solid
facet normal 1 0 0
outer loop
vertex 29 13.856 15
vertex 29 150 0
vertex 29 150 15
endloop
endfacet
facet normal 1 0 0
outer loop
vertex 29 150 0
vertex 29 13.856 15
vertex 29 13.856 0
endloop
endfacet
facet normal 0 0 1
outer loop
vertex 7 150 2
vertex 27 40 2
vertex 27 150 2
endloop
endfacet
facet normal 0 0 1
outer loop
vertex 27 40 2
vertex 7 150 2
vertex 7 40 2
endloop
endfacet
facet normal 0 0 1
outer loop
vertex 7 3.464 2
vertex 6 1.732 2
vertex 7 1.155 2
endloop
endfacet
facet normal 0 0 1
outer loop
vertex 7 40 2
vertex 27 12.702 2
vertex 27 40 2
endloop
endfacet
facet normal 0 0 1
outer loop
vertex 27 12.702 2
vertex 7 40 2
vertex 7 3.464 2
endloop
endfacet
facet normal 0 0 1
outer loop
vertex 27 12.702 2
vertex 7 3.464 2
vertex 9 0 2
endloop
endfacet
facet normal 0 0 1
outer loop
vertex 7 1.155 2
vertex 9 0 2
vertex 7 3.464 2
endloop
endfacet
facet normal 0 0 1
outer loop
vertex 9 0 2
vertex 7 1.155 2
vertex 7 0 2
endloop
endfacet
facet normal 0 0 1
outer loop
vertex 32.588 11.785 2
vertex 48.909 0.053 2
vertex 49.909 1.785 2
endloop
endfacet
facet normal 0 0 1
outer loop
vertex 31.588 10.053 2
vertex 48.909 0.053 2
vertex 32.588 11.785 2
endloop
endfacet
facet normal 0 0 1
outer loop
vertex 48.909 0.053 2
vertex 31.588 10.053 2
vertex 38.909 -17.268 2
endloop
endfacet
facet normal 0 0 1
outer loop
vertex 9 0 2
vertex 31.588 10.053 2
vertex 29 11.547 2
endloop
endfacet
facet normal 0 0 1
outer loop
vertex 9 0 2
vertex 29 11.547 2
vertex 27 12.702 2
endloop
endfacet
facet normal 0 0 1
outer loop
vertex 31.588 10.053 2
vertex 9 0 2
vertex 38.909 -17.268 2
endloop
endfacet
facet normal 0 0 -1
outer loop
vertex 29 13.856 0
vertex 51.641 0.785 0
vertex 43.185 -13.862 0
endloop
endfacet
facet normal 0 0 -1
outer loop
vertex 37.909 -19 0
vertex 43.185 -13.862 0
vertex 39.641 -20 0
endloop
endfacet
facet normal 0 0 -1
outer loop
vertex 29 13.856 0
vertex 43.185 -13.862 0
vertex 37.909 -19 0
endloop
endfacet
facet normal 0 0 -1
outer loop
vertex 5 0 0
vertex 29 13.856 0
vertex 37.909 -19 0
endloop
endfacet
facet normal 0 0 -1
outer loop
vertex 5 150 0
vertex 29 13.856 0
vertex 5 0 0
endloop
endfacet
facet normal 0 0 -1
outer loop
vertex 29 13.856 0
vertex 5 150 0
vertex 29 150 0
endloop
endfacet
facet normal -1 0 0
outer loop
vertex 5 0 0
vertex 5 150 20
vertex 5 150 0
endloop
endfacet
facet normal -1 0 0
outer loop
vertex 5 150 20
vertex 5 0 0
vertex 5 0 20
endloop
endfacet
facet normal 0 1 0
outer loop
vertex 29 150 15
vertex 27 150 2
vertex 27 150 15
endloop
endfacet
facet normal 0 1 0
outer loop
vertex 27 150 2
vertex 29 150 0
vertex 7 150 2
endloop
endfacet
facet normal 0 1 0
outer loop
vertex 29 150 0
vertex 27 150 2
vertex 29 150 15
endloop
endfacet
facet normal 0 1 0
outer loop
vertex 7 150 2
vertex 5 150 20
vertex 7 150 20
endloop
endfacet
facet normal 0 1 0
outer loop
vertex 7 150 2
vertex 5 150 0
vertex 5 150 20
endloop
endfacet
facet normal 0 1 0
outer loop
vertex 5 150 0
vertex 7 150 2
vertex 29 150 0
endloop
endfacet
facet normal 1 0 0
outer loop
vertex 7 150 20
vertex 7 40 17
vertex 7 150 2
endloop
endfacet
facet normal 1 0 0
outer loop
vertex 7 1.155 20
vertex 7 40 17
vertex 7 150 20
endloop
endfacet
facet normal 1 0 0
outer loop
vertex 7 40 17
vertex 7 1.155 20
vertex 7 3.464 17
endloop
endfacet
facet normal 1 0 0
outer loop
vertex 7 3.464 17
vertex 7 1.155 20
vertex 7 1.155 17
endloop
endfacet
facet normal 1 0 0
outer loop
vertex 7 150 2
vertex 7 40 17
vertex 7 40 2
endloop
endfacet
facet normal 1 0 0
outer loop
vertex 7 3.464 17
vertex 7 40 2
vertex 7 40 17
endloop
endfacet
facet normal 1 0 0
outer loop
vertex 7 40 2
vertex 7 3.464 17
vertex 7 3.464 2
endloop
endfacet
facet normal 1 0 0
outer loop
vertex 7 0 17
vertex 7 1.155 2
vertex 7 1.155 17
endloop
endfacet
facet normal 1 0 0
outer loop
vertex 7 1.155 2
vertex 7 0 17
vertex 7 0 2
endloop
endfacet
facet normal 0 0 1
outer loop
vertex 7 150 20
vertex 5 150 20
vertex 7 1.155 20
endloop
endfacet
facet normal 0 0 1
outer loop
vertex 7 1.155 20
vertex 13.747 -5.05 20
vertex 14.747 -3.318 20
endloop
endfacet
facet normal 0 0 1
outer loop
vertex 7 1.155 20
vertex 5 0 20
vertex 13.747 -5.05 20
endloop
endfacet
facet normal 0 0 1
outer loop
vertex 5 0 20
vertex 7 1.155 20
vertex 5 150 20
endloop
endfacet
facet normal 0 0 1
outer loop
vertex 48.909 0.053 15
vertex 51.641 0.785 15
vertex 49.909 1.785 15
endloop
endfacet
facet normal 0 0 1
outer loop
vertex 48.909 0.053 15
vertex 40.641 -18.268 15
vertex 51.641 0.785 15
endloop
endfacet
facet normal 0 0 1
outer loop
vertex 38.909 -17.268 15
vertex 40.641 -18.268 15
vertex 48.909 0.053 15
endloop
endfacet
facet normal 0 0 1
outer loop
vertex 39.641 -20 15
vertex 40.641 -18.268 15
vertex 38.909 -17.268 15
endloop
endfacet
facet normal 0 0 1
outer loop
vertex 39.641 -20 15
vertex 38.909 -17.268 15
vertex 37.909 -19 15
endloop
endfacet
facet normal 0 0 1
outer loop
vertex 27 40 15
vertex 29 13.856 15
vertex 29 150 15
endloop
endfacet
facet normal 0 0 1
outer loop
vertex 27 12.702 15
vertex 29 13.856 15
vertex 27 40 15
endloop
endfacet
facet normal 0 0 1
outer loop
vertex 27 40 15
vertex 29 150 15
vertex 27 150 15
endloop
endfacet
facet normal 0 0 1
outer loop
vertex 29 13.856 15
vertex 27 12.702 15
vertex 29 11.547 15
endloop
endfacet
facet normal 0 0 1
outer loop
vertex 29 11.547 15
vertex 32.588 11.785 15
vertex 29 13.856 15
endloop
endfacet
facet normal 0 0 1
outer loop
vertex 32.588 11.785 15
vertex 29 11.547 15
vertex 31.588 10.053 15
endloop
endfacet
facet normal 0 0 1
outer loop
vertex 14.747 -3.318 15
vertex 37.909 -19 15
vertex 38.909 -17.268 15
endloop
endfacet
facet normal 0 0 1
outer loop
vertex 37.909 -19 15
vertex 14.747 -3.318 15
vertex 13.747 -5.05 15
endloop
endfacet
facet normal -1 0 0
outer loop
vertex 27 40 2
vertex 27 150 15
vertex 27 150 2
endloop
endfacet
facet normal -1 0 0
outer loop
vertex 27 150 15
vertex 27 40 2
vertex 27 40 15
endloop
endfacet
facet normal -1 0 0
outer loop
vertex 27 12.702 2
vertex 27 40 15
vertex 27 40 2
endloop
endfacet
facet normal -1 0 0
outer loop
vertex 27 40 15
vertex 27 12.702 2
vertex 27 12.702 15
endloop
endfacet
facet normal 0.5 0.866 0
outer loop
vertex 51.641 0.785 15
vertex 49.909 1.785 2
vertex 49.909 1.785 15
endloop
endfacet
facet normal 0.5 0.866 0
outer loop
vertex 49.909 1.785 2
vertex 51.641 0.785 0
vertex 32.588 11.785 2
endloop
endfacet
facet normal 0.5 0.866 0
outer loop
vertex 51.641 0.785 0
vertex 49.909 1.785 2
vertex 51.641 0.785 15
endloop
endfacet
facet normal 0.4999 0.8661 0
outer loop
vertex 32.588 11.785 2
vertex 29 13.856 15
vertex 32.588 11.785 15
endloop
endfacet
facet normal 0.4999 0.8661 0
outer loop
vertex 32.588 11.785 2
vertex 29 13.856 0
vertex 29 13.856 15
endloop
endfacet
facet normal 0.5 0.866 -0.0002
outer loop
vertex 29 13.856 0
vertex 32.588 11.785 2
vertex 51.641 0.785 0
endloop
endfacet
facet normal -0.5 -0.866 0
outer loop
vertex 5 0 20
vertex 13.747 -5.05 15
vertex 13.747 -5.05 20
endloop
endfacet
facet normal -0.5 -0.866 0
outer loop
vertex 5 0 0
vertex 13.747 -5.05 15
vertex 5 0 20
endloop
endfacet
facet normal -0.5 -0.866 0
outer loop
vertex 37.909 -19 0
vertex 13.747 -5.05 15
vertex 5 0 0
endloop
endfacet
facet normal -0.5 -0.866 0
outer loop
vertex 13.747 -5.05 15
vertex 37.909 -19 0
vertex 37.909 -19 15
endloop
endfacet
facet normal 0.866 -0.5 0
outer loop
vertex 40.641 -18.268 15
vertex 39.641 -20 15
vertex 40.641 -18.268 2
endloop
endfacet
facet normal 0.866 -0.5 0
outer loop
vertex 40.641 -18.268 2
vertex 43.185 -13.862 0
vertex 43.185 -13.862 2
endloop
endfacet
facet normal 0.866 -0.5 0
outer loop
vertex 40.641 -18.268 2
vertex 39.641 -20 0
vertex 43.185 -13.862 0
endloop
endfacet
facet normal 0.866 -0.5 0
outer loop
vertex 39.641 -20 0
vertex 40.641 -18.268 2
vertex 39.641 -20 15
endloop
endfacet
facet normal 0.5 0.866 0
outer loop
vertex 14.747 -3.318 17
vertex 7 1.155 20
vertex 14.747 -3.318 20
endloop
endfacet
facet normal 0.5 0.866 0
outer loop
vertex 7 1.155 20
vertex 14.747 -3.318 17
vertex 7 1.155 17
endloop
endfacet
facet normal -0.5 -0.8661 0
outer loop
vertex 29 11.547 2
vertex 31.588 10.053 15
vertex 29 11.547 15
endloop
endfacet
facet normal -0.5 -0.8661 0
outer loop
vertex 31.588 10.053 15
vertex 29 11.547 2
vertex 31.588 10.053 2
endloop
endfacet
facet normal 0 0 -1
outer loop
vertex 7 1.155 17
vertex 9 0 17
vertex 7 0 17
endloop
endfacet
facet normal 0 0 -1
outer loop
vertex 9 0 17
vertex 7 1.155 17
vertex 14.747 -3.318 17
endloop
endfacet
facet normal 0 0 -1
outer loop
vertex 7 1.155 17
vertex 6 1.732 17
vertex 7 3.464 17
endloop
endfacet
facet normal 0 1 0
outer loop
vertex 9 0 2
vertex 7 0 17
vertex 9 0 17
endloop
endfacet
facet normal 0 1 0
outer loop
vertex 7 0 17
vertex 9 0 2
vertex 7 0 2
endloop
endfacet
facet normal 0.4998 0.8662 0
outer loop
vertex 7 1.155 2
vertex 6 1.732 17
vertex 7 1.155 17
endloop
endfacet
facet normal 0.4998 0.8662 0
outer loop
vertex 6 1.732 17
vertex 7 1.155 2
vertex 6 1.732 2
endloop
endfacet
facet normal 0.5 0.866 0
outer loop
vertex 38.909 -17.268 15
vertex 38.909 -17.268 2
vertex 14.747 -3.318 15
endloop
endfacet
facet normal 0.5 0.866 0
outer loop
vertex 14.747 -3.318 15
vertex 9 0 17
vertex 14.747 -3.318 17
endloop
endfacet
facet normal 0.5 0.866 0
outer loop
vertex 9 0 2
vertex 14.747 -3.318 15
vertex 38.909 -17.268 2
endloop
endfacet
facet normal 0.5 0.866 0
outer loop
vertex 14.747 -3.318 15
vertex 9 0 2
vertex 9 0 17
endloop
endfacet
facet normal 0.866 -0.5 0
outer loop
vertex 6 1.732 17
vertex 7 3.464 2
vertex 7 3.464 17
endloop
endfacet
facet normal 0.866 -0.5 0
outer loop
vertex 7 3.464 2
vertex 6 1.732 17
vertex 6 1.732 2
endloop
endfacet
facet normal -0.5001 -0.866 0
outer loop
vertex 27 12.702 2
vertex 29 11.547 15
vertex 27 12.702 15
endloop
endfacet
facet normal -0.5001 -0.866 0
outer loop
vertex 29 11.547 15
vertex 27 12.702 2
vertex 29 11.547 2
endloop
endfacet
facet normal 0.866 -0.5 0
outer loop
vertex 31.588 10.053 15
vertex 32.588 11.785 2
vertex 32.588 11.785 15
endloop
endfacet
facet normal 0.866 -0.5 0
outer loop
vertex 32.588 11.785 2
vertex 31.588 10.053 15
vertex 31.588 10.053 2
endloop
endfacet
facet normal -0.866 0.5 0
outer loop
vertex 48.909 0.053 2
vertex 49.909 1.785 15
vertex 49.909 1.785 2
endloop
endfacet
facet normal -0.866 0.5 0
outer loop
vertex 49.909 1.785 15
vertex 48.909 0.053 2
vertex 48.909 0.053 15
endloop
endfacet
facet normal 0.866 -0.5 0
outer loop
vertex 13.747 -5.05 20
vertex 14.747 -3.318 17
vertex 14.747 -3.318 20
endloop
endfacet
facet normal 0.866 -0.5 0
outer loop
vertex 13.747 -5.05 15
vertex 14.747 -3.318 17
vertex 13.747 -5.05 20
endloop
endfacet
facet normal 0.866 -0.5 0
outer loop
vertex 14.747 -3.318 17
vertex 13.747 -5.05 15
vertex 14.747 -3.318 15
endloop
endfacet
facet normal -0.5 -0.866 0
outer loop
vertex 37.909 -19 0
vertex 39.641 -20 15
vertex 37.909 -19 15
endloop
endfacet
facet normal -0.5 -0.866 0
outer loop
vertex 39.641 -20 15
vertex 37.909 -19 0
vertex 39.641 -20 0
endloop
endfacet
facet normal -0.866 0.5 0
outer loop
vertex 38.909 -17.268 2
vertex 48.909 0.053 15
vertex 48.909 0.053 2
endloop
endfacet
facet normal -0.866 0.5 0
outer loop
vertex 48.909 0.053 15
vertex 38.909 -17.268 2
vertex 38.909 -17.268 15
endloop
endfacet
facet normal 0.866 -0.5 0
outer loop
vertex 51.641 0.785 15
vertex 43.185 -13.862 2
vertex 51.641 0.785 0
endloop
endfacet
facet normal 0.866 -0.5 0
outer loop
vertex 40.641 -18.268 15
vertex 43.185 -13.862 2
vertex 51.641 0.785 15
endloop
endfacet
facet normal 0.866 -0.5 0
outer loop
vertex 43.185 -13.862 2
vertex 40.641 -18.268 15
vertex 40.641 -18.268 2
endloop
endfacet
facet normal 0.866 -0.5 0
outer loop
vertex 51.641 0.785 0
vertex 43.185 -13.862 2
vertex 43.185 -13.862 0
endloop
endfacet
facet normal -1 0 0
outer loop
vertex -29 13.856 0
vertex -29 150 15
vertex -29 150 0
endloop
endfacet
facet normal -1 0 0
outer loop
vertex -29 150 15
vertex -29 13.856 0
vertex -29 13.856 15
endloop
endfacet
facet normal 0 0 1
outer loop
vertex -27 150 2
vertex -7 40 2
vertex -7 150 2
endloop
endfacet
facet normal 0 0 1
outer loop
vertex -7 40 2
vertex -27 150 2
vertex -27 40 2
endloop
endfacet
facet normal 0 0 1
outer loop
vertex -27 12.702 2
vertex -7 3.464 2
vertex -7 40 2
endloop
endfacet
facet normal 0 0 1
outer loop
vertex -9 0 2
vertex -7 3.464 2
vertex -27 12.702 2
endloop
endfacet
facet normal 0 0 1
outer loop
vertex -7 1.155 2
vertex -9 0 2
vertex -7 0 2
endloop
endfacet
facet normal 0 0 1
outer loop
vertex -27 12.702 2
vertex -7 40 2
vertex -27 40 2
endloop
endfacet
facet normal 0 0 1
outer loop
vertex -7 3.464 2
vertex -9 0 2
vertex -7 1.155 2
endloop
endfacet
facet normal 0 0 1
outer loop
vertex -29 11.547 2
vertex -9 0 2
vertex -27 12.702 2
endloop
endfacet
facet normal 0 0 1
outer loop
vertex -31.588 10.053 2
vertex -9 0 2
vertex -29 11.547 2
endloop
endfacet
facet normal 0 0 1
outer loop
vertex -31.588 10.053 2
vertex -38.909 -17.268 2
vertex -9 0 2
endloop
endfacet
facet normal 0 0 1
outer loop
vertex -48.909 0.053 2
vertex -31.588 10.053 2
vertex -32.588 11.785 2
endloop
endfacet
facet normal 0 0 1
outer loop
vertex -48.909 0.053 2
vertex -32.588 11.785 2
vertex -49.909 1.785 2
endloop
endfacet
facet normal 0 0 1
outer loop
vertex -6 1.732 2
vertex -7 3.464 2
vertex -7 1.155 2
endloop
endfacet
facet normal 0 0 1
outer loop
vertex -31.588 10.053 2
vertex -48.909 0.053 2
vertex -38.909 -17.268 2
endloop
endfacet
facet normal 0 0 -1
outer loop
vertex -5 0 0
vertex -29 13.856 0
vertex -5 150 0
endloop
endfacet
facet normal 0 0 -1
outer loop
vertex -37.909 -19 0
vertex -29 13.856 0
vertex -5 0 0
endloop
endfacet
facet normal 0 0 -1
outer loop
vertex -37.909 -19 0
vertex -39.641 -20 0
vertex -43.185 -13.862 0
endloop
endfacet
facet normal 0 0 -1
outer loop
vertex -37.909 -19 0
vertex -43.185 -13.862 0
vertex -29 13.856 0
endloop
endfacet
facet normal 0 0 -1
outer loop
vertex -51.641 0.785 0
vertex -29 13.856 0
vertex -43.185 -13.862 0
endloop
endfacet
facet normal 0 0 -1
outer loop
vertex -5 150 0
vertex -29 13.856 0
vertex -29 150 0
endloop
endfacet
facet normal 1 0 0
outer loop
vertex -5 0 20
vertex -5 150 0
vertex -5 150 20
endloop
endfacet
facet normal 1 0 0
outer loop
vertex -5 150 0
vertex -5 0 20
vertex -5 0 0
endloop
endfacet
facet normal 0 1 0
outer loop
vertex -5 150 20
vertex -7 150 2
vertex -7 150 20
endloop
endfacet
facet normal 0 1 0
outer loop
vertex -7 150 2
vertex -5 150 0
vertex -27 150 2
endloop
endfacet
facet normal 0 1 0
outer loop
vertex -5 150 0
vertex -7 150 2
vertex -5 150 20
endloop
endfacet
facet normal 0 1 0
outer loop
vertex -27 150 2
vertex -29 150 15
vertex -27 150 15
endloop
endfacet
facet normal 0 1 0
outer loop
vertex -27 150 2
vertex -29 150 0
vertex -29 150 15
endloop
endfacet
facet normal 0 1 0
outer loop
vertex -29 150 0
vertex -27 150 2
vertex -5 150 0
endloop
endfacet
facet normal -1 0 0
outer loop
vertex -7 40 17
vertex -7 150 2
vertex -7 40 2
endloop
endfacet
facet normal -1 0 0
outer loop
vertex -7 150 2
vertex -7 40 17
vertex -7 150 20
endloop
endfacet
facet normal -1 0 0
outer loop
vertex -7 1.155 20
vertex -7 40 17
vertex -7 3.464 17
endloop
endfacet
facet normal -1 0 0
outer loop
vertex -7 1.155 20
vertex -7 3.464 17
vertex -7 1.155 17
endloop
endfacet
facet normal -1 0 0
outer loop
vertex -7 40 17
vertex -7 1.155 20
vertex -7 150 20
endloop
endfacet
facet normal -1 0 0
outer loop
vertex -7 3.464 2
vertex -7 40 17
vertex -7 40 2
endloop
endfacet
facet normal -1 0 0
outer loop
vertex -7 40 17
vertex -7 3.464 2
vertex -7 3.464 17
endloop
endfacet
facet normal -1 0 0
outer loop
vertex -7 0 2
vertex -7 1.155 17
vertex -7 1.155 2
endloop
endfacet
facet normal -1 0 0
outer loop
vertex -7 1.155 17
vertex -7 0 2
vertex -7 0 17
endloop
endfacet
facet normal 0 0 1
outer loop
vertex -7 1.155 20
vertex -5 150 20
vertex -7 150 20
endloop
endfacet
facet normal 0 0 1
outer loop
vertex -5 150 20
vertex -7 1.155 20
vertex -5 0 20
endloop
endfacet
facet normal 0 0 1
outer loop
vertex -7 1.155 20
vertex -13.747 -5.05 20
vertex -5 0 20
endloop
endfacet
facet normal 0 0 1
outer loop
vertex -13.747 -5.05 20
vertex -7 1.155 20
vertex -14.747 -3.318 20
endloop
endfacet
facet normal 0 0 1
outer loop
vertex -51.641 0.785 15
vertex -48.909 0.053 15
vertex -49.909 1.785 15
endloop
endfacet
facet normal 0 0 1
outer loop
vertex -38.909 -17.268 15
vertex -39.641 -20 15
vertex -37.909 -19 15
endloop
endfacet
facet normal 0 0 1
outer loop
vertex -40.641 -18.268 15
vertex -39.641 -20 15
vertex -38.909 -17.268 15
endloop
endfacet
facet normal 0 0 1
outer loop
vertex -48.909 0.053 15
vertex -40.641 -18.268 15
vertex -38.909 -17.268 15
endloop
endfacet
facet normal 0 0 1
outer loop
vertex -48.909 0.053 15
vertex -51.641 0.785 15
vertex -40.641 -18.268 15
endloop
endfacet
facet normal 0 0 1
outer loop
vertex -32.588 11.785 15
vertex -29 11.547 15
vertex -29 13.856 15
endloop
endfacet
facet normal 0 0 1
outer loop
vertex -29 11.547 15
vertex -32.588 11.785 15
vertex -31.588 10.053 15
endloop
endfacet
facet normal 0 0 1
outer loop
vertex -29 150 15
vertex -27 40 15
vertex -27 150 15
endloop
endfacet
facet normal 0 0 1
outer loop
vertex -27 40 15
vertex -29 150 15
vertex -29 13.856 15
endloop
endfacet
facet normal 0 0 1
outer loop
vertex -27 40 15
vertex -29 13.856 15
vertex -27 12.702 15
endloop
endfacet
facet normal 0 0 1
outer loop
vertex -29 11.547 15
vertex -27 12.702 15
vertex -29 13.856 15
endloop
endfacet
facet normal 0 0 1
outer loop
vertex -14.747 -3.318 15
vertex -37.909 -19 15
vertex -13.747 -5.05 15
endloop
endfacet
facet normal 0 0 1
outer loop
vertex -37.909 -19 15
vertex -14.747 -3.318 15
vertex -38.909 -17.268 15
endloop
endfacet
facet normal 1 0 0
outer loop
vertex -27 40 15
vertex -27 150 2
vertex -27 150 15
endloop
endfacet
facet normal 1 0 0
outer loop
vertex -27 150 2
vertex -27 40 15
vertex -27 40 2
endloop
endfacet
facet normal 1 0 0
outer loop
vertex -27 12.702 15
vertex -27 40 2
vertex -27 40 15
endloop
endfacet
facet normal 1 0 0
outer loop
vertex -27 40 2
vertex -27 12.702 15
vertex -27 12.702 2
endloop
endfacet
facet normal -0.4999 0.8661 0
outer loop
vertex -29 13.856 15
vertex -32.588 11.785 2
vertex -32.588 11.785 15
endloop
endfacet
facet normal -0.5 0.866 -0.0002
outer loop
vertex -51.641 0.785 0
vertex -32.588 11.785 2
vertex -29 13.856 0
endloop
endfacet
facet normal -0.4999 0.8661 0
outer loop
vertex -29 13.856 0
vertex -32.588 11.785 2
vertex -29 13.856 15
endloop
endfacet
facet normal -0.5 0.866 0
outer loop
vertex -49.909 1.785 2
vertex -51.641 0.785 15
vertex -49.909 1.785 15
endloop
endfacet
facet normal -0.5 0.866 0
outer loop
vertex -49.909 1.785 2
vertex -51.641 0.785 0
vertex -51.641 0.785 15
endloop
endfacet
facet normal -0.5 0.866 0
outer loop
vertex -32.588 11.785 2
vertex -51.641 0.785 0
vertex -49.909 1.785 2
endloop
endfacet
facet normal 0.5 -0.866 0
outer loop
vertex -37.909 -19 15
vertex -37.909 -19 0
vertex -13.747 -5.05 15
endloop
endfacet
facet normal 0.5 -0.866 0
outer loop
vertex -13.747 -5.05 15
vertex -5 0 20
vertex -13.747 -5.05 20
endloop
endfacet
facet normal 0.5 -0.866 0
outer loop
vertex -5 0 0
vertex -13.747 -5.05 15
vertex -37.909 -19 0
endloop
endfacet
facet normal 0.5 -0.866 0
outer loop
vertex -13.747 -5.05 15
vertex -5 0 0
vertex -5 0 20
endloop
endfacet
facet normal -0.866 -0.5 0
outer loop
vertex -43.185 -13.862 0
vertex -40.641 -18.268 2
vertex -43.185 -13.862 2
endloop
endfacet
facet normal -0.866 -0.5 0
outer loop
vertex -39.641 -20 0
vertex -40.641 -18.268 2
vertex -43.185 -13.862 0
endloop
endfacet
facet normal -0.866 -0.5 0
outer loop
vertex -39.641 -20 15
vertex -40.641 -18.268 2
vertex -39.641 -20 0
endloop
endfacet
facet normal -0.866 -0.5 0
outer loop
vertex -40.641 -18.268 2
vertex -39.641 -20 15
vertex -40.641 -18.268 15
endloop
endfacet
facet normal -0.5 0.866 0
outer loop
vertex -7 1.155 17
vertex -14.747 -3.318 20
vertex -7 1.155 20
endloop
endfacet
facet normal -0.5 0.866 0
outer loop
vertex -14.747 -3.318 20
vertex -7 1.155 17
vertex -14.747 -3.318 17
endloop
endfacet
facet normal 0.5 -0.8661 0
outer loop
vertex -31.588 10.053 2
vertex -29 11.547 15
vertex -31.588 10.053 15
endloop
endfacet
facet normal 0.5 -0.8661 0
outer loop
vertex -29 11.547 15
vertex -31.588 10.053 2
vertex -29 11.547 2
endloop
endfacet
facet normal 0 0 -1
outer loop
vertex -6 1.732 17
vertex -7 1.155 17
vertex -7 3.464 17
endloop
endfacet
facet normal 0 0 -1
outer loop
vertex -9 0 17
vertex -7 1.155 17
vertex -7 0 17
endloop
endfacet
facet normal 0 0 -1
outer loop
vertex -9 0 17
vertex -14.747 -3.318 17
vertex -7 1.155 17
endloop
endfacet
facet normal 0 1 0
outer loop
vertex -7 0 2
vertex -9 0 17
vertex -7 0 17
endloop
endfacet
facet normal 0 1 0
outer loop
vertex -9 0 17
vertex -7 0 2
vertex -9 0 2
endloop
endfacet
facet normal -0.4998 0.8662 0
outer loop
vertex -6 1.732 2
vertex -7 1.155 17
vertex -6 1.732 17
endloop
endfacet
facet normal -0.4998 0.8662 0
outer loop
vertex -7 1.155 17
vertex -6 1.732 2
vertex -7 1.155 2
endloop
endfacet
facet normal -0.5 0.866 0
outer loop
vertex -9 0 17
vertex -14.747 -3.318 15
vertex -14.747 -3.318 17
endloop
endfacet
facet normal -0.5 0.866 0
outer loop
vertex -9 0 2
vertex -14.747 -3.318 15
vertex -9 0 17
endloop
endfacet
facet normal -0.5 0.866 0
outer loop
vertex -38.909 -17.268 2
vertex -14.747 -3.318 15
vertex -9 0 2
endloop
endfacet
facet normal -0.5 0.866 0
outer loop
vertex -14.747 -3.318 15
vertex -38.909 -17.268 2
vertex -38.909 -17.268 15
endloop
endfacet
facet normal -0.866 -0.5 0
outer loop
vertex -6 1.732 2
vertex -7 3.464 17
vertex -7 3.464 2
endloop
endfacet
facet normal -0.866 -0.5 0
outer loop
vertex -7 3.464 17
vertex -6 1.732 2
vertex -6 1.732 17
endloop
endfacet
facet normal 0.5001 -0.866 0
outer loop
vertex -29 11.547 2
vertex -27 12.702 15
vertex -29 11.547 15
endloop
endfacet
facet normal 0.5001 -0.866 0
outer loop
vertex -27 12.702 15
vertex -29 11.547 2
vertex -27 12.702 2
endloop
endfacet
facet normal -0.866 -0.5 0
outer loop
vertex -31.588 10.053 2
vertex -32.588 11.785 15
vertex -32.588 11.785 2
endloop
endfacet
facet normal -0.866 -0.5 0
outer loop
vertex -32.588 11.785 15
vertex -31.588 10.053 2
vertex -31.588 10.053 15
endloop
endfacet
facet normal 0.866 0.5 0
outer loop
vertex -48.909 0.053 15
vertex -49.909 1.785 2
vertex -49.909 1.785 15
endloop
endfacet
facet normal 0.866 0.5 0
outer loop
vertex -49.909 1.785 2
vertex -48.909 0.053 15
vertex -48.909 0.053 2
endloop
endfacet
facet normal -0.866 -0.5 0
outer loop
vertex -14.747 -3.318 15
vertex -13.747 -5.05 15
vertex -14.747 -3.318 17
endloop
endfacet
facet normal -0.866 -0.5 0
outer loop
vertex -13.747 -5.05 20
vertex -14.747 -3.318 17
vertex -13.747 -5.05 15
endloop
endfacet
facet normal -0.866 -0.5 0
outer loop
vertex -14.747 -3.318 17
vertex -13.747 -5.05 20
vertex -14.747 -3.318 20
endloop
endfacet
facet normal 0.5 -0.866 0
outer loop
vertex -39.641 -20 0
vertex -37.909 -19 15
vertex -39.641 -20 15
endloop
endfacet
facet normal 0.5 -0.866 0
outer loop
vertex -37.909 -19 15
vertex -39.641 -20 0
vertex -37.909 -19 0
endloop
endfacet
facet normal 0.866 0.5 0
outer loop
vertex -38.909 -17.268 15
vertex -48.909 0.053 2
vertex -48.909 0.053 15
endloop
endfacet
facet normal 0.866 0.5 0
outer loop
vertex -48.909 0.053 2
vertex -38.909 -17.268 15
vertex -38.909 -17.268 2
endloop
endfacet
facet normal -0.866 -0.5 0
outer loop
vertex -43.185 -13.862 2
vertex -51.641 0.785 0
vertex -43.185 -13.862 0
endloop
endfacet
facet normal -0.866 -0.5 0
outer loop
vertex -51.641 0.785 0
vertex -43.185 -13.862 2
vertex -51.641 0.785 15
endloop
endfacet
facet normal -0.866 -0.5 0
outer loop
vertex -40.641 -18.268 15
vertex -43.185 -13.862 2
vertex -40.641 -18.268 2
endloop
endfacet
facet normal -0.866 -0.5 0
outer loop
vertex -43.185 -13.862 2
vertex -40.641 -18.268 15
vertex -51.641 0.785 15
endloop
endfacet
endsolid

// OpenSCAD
// file: battery.scad
module batteryAA()
{
  cylinder(h=48.5, r=14.5/2, $fs=0.1);
  translate([0,0, 48.5])
    cylinder(h=2, r=5.5/2, $fs=0.1);
}

module batteryAAA()
{
  cylinder(h=42.5, r=10.5/2, $fs=0.1);
  translate([0,0, 42.5])
    cylinder(h=1.5, r=4/2, $fs=0.1);
}

// just an exhibition - not used directly
translate([20,0,0])
  batteryAA();
translate([0,0,0])
  batteryAAA();
// main file
use <battery.scad>

surround        = 15;
height          = 150;
wall            = 2;
batteryDiameter = 20;
batteryLength   = 40;

module channel(h)
{
  // side
  cube([2*wall+batteryDiameter, h, wall]);
  // back wall
  cube([wall, h, batteryLength/2]);
  // front holding
  translate([wall+batteryDiameter, 0, 0])
    cube([wall, h, surround]);
}

module wing()
{
  difference()
  {
    // main channel part
    union()
    {
      channel(height);
      rotate([0,0,60])
        translate([0, -2*batteryDiameter, 0])
          channel(2*batteryDiameter);
    }
    // removal of unnecessary elements
    translate([wall, 0, wall])
      cube([batteryDiameter, 2*batteryDiameter, surround]);
    rotate([0,0,60])
      translate([wall, -2*batteryDiameter, wall])
        cube([batteryDiameter, 2*batteryDiameter, surround]);
    // removal of part from which battery will be extracted
    rotate([0,0,60])
      translate([3*wall, -2*batteryDiameter+wall, wall])
        cube([batteryDiameter, batteryDiameter, surround]);
    // extra space on the bottom for the fingers to catch the battery easily
    rotate([0,0,60])
      translate([-0.1, -2*batteryDiameter-0.1, surround])
        cube([batteryDiameter, 1.5*batteryDiameter, batteryLength/2-surround]);
  }
  rotate([0,0,60])
    translate([0, -2*batteryDiameter, 0])
      cube([2*wall+batteryDiameter, wall, surround]);
}


// display only
for(m = [0,1])
  mirror([m,0,0])
    translate([5,0,0])
      wing();
